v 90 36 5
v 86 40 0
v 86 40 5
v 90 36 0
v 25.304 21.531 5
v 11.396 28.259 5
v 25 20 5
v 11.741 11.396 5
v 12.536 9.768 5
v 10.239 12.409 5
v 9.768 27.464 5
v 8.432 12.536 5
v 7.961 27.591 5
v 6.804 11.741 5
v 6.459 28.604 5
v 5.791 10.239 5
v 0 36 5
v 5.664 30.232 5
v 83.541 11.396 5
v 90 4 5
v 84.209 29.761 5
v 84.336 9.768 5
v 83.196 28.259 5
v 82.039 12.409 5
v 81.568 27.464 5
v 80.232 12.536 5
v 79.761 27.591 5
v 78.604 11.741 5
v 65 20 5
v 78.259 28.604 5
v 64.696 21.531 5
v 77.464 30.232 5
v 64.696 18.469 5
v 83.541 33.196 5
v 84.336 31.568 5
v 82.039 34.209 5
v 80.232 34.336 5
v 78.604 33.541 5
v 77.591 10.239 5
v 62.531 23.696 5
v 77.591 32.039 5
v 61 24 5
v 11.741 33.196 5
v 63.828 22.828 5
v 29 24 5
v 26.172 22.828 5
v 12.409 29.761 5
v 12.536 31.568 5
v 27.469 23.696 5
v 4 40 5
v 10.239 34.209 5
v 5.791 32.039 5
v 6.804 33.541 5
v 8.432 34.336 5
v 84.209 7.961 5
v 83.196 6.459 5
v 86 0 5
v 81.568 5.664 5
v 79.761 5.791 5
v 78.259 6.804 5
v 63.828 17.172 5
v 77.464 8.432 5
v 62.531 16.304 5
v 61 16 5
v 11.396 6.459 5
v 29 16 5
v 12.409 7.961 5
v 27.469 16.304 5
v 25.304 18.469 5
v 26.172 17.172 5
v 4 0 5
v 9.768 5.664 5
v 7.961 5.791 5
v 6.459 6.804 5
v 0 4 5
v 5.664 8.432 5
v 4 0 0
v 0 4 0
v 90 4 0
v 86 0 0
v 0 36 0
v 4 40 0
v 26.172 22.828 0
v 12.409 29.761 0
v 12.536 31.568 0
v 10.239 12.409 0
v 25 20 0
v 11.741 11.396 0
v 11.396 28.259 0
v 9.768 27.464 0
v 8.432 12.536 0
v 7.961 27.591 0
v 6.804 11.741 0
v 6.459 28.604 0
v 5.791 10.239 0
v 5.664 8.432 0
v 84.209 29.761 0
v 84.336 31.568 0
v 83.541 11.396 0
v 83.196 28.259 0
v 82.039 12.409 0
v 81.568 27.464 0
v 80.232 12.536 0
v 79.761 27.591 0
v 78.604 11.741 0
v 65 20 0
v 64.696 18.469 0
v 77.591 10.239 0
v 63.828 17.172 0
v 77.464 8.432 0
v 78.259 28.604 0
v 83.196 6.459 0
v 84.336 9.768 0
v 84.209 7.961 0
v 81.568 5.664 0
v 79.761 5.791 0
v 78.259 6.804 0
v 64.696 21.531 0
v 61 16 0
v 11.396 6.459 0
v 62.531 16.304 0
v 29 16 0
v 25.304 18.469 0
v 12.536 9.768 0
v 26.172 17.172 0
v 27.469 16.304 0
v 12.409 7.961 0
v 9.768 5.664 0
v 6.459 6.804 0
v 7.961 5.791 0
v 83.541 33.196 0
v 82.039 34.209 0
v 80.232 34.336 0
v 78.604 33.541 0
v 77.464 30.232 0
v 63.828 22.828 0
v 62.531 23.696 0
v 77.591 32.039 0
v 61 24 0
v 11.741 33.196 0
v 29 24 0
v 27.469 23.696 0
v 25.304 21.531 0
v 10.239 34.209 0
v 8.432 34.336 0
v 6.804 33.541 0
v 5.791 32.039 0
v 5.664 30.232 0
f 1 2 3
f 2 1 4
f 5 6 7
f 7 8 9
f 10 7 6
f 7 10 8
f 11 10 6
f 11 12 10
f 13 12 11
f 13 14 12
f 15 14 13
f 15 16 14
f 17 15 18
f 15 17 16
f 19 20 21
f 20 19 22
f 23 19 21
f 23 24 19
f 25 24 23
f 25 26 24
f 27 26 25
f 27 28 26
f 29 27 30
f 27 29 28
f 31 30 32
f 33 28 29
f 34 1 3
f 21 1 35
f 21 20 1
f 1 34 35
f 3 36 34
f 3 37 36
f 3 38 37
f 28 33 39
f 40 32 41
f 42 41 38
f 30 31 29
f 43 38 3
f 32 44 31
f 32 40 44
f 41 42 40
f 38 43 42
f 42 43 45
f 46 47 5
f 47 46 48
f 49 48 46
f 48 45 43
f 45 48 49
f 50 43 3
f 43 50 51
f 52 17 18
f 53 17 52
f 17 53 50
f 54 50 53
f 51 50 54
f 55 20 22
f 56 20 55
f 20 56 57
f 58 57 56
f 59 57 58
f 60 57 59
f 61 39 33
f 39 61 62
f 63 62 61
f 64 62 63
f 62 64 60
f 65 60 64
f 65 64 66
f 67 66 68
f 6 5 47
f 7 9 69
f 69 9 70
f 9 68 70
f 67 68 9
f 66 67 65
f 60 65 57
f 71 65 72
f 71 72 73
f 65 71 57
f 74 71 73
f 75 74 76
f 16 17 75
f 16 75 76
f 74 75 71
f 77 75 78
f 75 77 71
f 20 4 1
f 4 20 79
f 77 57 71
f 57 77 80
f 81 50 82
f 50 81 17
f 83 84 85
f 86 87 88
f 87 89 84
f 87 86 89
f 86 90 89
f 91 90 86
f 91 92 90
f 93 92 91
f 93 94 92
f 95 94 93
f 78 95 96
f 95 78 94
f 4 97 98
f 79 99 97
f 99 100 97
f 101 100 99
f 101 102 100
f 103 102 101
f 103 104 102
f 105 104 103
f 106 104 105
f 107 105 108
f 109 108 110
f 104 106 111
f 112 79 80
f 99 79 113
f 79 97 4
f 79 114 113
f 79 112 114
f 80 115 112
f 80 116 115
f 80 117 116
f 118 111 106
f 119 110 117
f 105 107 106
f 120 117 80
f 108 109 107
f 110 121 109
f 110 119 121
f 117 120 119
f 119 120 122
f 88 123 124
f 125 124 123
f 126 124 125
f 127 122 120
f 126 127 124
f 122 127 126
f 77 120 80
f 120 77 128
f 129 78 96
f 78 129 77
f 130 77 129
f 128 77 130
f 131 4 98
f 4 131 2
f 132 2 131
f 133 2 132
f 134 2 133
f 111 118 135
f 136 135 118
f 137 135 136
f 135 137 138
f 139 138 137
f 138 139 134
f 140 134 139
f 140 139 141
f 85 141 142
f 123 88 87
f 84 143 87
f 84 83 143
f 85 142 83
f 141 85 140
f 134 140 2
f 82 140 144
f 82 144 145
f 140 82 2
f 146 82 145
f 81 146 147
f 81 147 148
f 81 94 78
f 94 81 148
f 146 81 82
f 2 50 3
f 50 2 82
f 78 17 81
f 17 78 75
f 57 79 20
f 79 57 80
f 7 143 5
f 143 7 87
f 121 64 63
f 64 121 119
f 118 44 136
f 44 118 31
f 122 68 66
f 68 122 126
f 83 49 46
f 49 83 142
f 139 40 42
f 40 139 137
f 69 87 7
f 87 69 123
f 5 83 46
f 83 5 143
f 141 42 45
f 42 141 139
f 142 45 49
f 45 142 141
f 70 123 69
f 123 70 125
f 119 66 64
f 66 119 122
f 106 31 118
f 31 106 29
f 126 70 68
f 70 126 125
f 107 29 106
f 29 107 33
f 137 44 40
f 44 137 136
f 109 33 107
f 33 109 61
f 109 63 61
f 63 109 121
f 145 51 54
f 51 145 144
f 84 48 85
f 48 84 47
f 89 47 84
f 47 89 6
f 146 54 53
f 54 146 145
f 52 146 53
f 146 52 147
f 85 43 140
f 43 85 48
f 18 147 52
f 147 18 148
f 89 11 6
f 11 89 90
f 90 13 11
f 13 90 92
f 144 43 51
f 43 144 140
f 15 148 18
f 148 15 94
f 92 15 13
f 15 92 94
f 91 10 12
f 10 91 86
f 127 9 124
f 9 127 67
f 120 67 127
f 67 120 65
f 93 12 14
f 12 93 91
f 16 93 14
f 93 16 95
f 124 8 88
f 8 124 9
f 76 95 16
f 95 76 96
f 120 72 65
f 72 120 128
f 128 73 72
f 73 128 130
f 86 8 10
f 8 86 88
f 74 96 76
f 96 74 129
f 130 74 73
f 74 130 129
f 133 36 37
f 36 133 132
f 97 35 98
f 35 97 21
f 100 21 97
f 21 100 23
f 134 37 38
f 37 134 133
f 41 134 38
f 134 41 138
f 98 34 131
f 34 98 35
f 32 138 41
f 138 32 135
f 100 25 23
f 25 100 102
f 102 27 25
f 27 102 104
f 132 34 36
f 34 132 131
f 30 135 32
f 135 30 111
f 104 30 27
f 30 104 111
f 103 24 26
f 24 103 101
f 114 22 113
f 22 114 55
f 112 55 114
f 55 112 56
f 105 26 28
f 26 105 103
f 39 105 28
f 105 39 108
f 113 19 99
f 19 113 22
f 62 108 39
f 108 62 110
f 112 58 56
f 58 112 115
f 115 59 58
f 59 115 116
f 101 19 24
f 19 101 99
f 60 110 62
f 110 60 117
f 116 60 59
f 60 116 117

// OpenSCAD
$fn = 32;

// ----------------------------------------------------------------------
// Bracket plate: slot plate 90 x 40
// ----------------------------------------------------------------------

// --- parameters (mm) ---
hole_r = 3.5;             // bolt hole radius
plate_t = 5;              // plate thickness, Z (extrusion height)
plate_l = 90;             // plate length
plate_w = 40;             // plate width
slot_l = 32;              // slot straight length
slot_r = 4;               // slot end radius

slot_len = slot_l + 2 * slot_r;
slot_w = 2 * slot_r;
hole_d2 = 2 * hole_r;

profile = [[4, 0], [86, 0], [90, 4], [90, 36], [86, 40], [4, 40], [0, 36], [0, 4]];  // primary outline, 8 points, counter clockwise
void_1 = [[61, 16], [62.531, 16.304], [63.828, 17.172], [64.696, 18.469], [65, 20], [64.696, 21.531], [63.828, 22.828], [62.531, 23.696], [61, 24], [29, 24], [27.469, 23.696], [26.172, 22.828], [25.304, 21.531], [25, 20], [25.304, 18.469], [26.172, 17.172], [27.469, 16.304], [29, 16]];  // grip slot, 18 points
void_2 = [[12.536, 31.568], [11.741, 33.196], [10.239, 34.209], [8.432, 34.336], [6.804, 33.541], [5.791, 32.039], [5.664, 30.232], [6.459, 28.604], [7.961, 27.591], [9.768, 27.464], [11.396, 28.259], [12.409, 29.761]];  // corner hole, 12 points
void_3 = [[12.536, 9.768], [11.741, 11.396], [10.239, 12.409], [8.432, 12.536], [6.804, 11.741], [5.791, 10.239], [5.664, 8.432], [6.459, 6.804], [7.961, 5.791], [9.768, 5.664], [11.396, 6.459], [12.409, 7.961]];  // corner hole, 12 points
void_4 = [[84.336, 31.568], [83.541, 33.196], [82.039, 34.209], [80.232, 34.336], [78.604, 33.541], [77.591, 32.039], [77.464, 30.232], [78.259, 28.604], [79.761, 27.591], [81.568, 27.464], [83.196, 28.259], [84.209, 29.761]];  // corner hole, 12 points
void_5 = [[84.336, 9.768], [83.541, 11.396], [82.039, 12.409], [80.232, 12.536], [78.604, 11.741], [77.591, 10.239], [77.464, 8.432], [78.259, 6.804], [79.761, 5.791], [81.568, 5.664], [83.196, 6.459], [84.209, 7.961]];  // corner hole, 12 points

// --- the one profile operation ---
difference() {
  linear_extrude(height = plate_t) polygon(points = profile);
  translate([0, 0, -1])
    linear_extrude(height = plate_t + 2) polygon(points = void_1);
  translate([0, 0, -1])
    linear_extrude(height = plate_t + 2) polygon(points = void_2);
  translate([0, 0, -1])
    linear_extrude(height = plate_t + 2) polygon(points = void_3);
  translate([0, 0, -1])
    linear_extrude(height = plate_t + 2) polygon(points = void_4);
  translate([0, 0, -1])
    linear_extrude(height = plate_t + 2) polygon(points = void_5);
}
